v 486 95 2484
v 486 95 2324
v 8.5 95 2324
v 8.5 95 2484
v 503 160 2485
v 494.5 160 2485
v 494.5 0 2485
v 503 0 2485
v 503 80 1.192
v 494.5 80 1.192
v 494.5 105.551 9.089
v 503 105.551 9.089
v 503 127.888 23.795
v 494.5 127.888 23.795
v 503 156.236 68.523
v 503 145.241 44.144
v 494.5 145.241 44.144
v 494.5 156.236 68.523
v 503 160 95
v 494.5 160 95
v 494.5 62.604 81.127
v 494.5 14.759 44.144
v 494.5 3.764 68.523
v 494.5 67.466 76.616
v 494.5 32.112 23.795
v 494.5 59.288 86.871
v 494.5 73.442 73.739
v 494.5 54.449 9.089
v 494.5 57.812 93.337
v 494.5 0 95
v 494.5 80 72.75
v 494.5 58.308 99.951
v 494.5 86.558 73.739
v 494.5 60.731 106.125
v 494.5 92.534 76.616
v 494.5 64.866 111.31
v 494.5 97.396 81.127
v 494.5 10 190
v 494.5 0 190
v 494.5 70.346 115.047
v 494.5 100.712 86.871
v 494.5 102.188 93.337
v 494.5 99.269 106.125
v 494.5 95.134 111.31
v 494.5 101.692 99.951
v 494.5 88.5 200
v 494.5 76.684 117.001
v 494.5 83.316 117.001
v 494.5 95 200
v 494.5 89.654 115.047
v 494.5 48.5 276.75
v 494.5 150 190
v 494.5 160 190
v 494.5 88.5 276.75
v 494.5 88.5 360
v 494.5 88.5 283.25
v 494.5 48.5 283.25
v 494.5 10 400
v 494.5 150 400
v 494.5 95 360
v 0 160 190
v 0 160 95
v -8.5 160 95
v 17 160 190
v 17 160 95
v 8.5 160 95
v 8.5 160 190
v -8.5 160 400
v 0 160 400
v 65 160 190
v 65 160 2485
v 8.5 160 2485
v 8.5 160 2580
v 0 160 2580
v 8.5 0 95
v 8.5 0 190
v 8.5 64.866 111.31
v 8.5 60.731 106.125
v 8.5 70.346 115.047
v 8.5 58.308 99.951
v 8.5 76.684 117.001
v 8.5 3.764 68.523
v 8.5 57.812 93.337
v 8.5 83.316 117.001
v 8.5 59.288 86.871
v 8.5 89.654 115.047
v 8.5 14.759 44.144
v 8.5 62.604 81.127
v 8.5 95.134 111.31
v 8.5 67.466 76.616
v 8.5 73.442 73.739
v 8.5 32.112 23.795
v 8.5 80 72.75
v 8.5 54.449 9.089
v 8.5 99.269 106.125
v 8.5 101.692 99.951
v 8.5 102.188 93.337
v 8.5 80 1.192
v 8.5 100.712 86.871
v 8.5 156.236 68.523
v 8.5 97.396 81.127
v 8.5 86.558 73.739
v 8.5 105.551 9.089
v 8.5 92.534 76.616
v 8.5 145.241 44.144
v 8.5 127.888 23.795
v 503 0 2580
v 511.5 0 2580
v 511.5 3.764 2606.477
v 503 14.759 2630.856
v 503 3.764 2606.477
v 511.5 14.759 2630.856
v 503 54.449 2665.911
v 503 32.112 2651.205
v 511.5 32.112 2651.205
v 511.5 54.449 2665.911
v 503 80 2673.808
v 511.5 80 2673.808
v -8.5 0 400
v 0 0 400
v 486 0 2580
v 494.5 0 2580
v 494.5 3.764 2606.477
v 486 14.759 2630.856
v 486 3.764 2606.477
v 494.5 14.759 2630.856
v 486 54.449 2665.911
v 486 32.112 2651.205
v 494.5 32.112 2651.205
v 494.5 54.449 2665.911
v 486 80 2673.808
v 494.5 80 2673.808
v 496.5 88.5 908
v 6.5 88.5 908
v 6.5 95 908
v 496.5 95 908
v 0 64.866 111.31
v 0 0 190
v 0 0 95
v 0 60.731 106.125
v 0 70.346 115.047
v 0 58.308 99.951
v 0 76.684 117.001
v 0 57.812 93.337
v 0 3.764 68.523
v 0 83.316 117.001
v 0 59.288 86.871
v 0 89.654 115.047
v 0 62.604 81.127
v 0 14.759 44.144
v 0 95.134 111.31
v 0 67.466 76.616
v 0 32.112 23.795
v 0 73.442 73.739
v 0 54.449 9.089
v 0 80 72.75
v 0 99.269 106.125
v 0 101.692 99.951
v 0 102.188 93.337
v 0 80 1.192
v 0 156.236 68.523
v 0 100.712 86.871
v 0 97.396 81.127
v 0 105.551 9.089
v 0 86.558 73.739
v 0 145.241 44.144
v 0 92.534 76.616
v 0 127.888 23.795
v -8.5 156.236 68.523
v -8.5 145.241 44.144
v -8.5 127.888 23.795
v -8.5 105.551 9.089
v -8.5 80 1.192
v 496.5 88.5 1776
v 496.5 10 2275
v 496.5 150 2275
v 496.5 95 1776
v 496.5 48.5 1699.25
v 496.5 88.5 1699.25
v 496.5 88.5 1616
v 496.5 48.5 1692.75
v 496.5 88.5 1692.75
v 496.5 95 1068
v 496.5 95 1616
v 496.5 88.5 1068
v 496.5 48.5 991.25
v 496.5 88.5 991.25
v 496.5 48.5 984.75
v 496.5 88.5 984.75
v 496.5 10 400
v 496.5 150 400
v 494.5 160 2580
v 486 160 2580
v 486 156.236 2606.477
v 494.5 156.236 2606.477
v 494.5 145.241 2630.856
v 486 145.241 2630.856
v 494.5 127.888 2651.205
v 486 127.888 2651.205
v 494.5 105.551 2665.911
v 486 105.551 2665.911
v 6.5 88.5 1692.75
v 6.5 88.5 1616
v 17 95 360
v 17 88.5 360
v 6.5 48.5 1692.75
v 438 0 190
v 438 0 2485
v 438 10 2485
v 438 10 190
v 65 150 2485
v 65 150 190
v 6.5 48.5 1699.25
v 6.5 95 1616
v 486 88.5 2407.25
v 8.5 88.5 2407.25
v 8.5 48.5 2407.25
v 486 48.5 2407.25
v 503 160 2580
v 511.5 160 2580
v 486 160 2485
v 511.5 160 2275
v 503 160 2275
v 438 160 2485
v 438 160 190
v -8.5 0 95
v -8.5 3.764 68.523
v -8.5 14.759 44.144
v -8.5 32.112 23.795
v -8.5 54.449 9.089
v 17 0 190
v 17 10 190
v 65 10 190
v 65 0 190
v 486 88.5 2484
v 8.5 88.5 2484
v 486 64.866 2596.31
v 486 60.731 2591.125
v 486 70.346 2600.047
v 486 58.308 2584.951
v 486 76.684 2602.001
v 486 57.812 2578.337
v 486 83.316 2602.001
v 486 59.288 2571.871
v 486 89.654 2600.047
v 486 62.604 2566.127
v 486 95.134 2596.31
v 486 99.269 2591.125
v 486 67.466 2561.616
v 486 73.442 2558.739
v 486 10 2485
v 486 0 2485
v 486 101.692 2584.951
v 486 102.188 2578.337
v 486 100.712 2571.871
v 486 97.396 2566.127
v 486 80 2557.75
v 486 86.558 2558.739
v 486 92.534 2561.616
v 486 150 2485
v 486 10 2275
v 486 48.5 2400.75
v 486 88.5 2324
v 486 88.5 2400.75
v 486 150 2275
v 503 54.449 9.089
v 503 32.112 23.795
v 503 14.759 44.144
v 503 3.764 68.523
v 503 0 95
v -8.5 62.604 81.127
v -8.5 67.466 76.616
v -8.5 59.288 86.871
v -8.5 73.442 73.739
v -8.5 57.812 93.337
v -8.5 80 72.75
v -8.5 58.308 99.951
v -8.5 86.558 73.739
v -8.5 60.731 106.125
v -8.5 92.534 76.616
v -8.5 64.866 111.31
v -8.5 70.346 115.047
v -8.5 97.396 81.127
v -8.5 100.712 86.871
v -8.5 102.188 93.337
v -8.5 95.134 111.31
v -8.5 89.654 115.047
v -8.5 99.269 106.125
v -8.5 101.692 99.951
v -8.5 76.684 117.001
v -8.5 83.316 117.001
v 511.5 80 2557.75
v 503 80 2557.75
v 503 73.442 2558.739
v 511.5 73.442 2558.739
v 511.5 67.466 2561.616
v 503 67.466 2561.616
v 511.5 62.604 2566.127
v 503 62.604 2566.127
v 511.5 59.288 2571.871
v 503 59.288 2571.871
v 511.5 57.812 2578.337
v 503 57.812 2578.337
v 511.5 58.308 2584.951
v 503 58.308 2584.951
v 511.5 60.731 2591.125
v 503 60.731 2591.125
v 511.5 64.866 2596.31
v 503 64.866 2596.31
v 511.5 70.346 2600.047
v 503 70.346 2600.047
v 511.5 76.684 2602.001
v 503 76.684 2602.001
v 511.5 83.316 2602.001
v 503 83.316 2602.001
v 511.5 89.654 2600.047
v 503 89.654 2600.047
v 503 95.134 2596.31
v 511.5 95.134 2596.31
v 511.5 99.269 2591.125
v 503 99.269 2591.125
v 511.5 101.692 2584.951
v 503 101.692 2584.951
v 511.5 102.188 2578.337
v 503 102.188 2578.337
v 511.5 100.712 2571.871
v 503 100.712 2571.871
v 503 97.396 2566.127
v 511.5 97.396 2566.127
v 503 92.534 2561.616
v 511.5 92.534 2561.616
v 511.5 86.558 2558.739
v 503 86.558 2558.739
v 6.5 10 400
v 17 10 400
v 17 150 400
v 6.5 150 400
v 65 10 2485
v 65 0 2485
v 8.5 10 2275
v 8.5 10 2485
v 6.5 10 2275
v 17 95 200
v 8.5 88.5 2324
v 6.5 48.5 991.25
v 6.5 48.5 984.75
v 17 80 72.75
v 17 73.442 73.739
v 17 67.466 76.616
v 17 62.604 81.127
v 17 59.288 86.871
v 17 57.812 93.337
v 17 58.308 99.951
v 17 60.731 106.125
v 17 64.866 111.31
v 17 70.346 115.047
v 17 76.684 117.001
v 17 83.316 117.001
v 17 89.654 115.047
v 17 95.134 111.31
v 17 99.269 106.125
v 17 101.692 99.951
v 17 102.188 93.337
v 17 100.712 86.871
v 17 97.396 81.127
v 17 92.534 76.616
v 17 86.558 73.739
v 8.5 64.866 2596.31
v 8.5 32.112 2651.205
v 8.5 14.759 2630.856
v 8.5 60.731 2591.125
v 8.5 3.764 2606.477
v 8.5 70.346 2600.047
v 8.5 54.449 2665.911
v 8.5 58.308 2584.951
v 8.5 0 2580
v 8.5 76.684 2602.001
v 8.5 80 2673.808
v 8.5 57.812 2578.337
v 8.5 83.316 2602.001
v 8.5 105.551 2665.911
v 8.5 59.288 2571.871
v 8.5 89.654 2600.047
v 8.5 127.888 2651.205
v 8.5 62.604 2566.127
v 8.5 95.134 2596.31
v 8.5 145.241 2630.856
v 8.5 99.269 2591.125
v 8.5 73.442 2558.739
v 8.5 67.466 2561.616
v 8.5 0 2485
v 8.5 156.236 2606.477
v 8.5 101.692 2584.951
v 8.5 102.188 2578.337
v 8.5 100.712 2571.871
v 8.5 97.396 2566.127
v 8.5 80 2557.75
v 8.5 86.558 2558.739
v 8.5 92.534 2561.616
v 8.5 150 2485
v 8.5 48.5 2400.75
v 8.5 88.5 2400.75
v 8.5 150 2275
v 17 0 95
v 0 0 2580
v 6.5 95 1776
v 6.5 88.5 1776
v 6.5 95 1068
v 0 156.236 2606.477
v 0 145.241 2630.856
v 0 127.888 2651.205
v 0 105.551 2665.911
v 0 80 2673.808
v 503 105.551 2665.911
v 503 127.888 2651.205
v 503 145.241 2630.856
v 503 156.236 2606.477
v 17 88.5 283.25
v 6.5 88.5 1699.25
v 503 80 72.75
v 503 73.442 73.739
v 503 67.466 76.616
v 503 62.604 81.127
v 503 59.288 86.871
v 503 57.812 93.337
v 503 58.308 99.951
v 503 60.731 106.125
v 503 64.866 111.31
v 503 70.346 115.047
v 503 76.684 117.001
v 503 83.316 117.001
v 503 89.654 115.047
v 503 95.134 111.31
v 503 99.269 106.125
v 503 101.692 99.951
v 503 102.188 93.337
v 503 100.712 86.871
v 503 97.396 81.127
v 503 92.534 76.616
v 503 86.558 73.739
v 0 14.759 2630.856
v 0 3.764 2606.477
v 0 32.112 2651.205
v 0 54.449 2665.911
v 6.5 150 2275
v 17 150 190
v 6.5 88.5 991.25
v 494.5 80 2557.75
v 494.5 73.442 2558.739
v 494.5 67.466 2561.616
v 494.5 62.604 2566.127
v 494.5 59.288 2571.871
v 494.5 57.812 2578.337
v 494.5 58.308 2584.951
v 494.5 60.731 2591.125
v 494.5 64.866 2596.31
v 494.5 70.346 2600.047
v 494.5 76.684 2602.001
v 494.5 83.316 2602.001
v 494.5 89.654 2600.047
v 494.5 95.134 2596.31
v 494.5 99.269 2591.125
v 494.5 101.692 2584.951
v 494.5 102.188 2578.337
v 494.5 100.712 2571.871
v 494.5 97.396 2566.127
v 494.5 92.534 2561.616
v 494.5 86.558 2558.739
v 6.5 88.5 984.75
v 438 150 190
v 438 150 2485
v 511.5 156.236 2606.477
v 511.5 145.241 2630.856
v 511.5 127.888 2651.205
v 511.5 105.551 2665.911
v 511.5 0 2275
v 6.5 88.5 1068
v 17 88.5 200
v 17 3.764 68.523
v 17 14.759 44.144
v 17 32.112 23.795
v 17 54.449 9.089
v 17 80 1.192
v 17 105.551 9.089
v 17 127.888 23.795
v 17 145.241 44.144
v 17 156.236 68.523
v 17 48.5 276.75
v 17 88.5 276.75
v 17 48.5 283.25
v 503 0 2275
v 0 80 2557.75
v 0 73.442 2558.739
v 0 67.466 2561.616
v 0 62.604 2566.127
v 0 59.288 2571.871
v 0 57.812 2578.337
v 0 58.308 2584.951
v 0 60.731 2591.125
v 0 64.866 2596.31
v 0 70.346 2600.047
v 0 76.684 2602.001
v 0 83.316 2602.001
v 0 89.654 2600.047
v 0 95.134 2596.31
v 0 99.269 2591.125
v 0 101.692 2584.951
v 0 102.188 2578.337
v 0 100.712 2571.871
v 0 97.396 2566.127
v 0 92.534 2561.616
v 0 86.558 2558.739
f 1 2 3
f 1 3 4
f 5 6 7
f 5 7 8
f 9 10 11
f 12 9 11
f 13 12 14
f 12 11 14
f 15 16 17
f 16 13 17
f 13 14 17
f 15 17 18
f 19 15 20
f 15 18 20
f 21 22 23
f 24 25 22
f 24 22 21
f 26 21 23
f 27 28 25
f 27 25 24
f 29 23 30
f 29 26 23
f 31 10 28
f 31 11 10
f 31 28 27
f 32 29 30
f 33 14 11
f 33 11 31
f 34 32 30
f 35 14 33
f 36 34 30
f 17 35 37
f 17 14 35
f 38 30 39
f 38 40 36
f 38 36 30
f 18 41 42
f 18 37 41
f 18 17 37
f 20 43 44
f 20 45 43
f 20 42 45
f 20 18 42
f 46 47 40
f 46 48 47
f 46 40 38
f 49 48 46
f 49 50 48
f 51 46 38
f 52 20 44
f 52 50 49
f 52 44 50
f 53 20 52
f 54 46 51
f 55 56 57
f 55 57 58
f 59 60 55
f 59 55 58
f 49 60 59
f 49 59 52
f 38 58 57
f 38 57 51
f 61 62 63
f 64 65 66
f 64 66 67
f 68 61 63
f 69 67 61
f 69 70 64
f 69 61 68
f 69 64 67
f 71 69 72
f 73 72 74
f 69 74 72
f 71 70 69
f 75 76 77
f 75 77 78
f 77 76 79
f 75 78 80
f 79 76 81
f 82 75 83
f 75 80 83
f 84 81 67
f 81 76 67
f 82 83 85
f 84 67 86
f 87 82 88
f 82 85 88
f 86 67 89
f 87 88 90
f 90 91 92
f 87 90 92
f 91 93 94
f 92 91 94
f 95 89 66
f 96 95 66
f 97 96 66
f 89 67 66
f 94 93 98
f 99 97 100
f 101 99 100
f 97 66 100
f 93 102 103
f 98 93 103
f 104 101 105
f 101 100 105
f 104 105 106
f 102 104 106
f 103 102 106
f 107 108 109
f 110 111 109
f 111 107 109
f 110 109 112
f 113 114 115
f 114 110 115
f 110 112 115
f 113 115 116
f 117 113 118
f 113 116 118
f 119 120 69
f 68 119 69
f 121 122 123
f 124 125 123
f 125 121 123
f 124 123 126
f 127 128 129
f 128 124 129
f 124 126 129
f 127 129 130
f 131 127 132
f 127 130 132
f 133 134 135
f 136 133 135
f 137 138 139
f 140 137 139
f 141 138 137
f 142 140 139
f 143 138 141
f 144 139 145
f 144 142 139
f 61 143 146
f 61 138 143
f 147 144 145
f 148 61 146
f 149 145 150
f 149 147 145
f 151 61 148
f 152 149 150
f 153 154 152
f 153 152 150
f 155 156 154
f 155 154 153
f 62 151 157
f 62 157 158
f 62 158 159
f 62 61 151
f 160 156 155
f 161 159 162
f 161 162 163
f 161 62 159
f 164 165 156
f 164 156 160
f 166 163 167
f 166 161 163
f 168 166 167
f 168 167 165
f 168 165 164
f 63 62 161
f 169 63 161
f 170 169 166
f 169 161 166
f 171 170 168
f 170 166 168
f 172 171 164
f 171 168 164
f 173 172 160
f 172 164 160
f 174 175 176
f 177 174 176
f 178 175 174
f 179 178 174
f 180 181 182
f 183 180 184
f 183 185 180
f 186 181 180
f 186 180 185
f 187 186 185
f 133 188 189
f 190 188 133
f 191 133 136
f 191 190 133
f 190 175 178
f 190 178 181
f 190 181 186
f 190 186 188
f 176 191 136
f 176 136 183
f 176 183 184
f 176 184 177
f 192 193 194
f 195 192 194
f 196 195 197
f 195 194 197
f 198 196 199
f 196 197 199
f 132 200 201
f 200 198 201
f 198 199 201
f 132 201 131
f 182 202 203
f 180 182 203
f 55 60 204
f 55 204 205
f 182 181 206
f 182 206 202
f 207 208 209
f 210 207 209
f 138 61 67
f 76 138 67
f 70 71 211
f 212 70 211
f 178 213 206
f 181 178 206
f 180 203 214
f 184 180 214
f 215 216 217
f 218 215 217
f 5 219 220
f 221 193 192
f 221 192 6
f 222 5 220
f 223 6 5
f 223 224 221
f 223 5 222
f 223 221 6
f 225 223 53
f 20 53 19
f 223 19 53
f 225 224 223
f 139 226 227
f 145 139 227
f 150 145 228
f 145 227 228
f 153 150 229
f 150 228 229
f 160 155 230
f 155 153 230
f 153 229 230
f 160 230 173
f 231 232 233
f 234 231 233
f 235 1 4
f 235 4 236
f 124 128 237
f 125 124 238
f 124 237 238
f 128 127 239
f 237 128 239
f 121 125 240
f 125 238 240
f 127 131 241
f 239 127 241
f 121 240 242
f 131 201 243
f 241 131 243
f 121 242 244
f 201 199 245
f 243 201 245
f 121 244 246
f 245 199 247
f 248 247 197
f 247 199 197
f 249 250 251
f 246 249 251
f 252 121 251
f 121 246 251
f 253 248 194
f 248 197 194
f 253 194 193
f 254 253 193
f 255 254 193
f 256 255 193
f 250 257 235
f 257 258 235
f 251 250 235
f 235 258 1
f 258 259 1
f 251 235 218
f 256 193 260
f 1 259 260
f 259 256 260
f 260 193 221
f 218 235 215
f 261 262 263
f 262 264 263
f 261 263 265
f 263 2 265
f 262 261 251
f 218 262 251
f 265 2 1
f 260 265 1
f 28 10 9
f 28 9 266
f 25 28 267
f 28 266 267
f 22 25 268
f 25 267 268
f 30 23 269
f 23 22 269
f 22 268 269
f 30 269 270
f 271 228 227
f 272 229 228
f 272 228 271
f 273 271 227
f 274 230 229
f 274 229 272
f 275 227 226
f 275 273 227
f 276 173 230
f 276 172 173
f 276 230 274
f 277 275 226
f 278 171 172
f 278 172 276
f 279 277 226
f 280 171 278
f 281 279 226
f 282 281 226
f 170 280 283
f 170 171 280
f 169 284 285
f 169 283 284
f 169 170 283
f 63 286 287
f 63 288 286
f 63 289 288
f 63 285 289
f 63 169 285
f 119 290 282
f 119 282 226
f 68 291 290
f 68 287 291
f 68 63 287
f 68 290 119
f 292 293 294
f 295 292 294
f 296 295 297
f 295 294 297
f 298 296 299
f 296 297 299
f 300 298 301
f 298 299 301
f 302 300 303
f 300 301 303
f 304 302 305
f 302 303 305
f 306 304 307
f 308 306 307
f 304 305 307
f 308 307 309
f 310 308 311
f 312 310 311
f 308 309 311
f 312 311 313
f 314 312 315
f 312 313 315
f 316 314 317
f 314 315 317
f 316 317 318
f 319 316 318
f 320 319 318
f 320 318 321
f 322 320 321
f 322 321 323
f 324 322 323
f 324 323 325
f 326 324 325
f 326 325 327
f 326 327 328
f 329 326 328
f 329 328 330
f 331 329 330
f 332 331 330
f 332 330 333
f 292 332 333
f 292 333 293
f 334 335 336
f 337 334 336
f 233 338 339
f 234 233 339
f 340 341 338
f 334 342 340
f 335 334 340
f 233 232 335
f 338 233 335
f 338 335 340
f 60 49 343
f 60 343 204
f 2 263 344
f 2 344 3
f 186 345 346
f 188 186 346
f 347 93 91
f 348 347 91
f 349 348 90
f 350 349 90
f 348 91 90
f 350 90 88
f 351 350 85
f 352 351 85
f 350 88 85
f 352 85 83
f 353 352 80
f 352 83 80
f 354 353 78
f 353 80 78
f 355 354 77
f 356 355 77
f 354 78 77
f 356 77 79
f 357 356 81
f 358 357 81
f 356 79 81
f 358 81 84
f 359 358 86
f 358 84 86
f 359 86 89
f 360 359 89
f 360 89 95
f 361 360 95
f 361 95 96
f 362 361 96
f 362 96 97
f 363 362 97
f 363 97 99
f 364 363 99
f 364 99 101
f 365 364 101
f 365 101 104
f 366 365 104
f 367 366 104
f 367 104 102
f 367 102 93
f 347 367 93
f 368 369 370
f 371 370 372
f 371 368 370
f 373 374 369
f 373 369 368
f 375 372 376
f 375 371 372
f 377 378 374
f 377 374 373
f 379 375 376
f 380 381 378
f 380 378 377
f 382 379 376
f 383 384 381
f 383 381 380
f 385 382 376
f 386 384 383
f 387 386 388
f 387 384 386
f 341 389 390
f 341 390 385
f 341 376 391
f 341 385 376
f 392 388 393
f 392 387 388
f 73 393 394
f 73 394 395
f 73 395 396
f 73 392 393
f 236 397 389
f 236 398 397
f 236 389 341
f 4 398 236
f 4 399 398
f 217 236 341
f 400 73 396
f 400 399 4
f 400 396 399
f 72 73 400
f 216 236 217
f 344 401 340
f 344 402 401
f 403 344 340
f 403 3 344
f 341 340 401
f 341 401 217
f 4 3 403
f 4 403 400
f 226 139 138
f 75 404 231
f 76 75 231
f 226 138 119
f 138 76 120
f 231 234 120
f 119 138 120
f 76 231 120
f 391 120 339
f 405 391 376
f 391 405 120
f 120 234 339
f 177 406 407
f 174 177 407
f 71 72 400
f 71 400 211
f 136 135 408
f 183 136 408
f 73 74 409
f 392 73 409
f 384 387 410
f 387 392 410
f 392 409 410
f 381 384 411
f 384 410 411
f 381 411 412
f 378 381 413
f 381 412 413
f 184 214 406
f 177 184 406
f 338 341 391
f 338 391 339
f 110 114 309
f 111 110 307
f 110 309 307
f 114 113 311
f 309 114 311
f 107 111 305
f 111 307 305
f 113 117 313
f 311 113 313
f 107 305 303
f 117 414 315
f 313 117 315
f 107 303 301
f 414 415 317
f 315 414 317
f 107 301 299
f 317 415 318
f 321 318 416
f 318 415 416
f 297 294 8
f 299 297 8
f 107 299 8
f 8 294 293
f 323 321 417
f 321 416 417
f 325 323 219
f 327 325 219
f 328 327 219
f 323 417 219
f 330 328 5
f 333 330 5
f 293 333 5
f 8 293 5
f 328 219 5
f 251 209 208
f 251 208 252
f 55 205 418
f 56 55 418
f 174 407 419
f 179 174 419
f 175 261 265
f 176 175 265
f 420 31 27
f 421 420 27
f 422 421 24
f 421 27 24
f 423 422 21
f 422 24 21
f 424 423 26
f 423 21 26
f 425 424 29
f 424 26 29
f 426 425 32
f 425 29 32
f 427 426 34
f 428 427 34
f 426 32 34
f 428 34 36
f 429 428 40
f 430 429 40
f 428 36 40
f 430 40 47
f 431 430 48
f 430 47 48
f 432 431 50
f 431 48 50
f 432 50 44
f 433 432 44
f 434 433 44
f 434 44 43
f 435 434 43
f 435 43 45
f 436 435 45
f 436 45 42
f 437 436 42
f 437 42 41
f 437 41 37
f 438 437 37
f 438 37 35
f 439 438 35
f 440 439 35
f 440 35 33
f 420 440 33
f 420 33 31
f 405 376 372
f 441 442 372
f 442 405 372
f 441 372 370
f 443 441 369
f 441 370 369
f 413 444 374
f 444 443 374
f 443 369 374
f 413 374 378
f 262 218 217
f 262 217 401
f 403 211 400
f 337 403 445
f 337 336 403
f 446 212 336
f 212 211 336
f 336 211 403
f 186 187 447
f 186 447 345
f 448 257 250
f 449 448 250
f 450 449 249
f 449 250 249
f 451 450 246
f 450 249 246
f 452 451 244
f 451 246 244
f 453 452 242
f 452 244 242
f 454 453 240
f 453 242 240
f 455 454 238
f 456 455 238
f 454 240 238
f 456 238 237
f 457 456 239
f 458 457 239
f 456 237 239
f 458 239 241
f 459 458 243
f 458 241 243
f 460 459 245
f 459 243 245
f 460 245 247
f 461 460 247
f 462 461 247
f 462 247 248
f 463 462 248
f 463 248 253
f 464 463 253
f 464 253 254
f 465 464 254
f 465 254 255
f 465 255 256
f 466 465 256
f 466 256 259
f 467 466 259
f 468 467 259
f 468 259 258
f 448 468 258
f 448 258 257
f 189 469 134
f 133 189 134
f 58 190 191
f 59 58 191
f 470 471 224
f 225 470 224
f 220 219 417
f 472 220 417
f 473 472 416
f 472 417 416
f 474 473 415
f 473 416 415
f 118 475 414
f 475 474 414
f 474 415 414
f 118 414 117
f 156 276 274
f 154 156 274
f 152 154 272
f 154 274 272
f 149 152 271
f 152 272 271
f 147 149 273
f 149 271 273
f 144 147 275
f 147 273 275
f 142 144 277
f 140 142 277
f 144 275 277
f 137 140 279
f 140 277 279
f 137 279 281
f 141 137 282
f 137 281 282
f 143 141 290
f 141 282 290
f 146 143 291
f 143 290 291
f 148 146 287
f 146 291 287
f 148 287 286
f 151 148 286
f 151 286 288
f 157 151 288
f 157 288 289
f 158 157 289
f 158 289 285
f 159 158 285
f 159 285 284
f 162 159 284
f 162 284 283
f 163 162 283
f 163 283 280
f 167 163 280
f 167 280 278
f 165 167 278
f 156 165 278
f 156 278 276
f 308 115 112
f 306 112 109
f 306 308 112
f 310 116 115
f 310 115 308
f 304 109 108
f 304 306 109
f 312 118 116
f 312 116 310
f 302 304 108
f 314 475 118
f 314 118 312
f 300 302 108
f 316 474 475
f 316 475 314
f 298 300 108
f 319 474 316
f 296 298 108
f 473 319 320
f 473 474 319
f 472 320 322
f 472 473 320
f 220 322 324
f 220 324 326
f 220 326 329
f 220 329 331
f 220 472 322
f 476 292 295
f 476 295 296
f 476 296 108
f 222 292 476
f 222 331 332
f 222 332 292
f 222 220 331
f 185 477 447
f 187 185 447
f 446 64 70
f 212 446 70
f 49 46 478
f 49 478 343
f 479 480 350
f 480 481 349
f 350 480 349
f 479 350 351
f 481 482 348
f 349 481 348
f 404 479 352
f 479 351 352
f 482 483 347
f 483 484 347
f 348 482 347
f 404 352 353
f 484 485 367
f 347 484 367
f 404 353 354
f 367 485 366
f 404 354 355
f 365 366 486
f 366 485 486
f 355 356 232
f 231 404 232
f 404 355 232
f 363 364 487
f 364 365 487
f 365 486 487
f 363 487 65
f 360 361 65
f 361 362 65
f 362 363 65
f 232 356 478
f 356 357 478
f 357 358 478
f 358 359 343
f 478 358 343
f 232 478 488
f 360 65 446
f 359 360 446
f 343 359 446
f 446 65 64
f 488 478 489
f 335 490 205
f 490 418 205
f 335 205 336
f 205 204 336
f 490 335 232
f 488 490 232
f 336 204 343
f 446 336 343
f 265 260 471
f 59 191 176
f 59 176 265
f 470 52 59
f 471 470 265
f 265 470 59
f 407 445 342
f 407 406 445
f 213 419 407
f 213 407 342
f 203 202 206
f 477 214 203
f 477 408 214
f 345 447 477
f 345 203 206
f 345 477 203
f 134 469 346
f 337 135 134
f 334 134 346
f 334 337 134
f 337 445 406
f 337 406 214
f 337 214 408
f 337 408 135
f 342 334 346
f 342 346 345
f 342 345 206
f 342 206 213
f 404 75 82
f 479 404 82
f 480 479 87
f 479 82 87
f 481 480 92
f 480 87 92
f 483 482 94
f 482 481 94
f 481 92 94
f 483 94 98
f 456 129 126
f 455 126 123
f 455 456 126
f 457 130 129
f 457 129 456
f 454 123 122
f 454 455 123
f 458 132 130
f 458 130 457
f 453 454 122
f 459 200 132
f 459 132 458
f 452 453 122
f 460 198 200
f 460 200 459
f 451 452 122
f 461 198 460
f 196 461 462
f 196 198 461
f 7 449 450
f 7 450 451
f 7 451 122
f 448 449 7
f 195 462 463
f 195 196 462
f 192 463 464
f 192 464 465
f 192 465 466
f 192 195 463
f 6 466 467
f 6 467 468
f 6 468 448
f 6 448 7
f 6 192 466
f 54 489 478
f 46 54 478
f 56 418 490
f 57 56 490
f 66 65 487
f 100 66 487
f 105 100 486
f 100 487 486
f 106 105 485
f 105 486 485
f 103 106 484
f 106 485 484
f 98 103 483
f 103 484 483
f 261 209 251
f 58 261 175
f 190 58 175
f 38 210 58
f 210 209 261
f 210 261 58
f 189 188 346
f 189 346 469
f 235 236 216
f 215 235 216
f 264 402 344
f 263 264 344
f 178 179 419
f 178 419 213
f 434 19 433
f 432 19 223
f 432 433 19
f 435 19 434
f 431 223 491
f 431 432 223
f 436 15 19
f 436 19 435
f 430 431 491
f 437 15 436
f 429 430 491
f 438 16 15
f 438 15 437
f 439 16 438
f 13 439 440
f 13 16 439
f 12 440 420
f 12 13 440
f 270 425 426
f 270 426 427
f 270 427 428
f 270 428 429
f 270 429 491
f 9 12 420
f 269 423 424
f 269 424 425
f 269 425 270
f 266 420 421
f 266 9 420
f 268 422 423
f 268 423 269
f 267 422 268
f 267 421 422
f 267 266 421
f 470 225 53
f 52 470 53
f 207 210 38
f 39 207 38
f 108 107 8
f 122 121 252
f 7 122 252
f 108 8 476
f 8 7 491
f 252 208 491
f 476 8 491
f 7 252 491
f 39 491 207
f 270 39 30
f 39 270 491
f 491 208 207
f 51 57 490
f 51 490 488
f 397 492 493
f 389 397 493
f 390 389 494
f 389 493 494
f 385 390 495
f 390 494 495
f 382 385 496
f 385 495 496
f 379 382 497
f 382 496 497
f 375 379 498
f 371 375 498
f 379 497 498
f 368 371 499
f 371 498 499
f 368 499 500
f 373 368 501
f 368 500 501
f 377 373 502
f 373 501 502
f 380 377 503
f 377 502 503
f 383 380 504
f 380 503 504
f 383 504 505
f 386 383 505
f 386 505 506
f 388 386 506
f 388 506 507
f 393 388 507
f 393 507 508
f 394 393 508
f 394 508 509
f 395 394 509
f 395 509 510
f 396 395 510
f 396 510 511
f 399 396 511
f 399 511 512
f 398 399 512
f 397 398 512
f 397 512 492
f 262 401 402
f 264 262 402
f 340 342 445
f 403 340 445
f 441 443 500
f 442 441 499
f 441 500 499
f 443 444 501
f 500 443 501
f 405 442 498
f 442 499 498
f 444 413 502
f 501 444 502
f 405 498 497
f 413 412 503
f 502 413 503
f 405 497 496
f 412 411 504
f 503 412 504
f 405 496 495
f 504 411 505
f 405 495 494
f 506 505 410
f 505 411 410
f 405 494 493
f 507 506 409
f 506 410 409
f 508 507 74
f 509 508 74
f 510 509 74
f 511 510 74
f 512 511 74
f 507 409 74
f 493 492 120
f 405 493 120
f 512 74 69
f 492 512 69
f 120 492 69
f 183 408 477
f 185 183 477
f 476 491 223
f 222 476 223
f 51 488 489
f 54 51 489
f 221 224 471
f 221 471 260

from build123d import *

# Parameters (mm, degrees)
EXTRUDE_1_DEPTH        = 2675
EXTRUDE_1_2_DEPTH      = 2675
EXTRUDE_3_DEPTH        = 503
SKETCH_6_W             = 486
SKETCH_6_H             = 190
CUT_EXTRUDE_4_DEPTH    = 2727.57917545
PATTERN_LINEAR_1_COUNT = 4
PATTERN_LINEAR_1_PITCH = 708
SKETCH_7_W             = 400
SKETCH_7_H             = 140
EXTRUDE_5_DEPTH        = 2
SKETCH_15_W            = 400
SKETCH_15_H            = 140
EXTRUDE_8_DEPTH        = 2
SKETCH_19_W            = 400
SKETCH_19_H            = 160
EXTRUDE_11_DEPTH       = 8.5
PATTERN_LINEAR_2_COUNT = 2
PATTERN_LINEAR_2_PITCH = 17
SKETCH_22_W            = 8.5
SKETCH_22_H            = 190
CUT_EXTRUDE_12_DEPTH   = 2729.160048458
SKETCH_23_R            = 11
SKETCH_23_R_2          = 22.25
CUT_EXTRUDE_13_DEPTH   = 2729.160048458
SKETCH_26_W            = 400
SKETCH_26_H            = 160
EXTRUDE_14_DEPTH       = 8.5
PATTERN_LINEAR_3_COUNT = 2
PATTERN_LINEAR_3_PITCH = 17
SKETCH_27_W            = 8.5
SKETCH_27_H            = 190
CUT_EXTRUDE_15_DEPTH   = 2729.160048458
SKETCH_28_R            = 22.25
CUT_EXTRUDE_16_DEPTH   = 2730.766473528
FILLET_2_R             = 95


with BuildPart() as part:
    # 草图2 → 拉伸1 (new body)
    with BuildSketch(Plane.XY):
        Polygon((0, 0), (0, 160), (65, 160), (65, 150), (6.5, 150), (6.5, 10), (65, 10), (65, 0), align=None)
    extrude(amount=EXTRUDE_1_DEPTH)



with BuildPart() as body_2:
    # 草图2 → Extrude 1 2 (new body)
    with BuildSketch(Plane.XY):
        Polygon((438, 160), (503, 160), (503, 0), (438, 0), (438, 10), (496.5, 10), (496.5, 150), (438, 150), align=None)
    extrude(amount=EXTRUDE_1_2_DEPTH)


with BuildPart() as part_1:
    add(part.part)

    add(body_2.part)  # 拉伸3 merges body 2
    # 草图5 → 拉伸3 (add)
    with BuildSketch(Plane.ZY):
        Polygon((200, 95), (360, 95), (360, 88.5), (283.25, 88.5), (283.25, 48.5), (276.75, 48.5), (276.75, 88.5), (200, 88.5), align=None)
    extrude_3 = extrude(amount=-EXTRUDE_3_DEPTH)

    # 草图6 → 拉伸4 (cut, through all)
    with BuildSketch(Plane(origin=(0, 160, 0), x_dir=(1, 0, 0), z_dir=(0, 1, 0))):
        with Locations((251.5, -95)):
            Rectangle(SKETCH_6_W, SKETCH_6_H)
        with Locations((251.5, -2580)):
            Rectangle(SKETCH_6_W, SKETCH_6_H)
    extrude(amount=-CUT_EXTRUDE_4_DEPTH, mode=Mode.SUBTRACT)

    # 阵列(线性)1: 拉伸3 ×4
    with Locations(*[(0, 0, i * PATTERN_LINEAR_1_PITCH) for i in range(1, PATTERN_LINEAR_1_COUNT)]):
        add(extrude_3)

    # 草图7 → 拉伸5 (add)
    with BuildSketch(Plane.ZY.offset(-496.5)):
        with Locations((200, 80)):
            Rectangle(SKETCH_7_W, SKETCH_7_H)
        with Locations((2475, 80)):
            Rectangle(SKETCH_7_W, SKETCH_7_H)
    extrude(amount=EXTRUDE_5_DEPTH)

    # 草图15 → 拉伸8 (add)
    with BuildSketch(Plane(origin=(6.5, 0, 0), x_dir=(0, 0, -1), z_dir=(1, 0, 0))):
        with Locations((-2475, 80)):
            Rectangle(SKETCH_15_W, SKETCH_15_H)
        with Locations((-200, 80)):
            Rectangle(SKETCH_15_W, SKETCH_15_H)
    extrude(amount=EXTRUDE_8_DEPTH)

    # 草图19 → 拉伸11 (add)
    with BuildSketch(Plane(origin=(503, 0, 0), x_dir=(0, 0, -1), z_dir=(1, 0, 0))):
        with Locations((-2475, 80)):
            Rectangle(SKETCH_19_W, SKETCH_19_H)
    extrude_11 = extrude(amount=EXTRUDE_11_DEPTH)

    # 阵列(线性)2: 拉伸11 ×2
    with Locations(*[(-i * PATTERN_LINEAR_2_PITCH, 0, 0) for i in range(1, PATTERN_LINEAR_2_COUNT)]):
        add(extrude_11)

    # 草图22 → 拉伸12 (cut, through all)
    with BuildSketch(Plane(origin=(0, 160, 0), x_dir=(1, 0, 0), z_dir=(0, 1, 0))):
        with Locations((498.75, -2580)):
            Rectangle(SKETCH_22_W, SKETCH_22_H)
    extrude(amount=-CUT_EXTRUDE_12_DEPTH, mode=Mode.SUBTRACT)

    # 草图23 → 拉伸13 (cut, through all)
    with BuildSketch(Plane.ZY):
        with Locations((95, 80)):
            Circle(SKETCH_23_R)
        with Locations(Location((2580, 80, 0), (0, 0, 180))):
            Circle(SKETCH_23_R_2)
    extrude(amount=-CUT_EXTRUDE_13_DEPTH, mode=Mode.SUBTRACT)

    # 草图26 → 拉伸14 (add)
    with BuildSketch(Plane.ZY):
        with Locations((200, 80)):
            Rectangle(SKETCH_26_W, SKETCH_26_H)
    extrude_14 = extrude(amount=EXTRUDE_14_DEPTH)

    # 阵列(线性)3: 拉伸14 ×2
    with Locations(*[(i * PATTERN_LINEAR_3_PITCH, 0, 0) for i in range(1, PATTERN_LINEAR_3_COUNT)]):
        add(extrude_14)

    # 草图27 → 拉伸15 (cut, through all)
    with BuildSketch(Plane(origin=(0, 160, 0), x_dir=(1, 0, 0), z_dir=(0, 1, 0))):
        with Locations((4.25, -95)):
            Rectangle(SKETCH_27_W, SKETCH_27_H)
    extrude(amount=-CUT_EXTRUDE_15_DEPTH, mode=Mode.SUBTRACT)

    # 草图28 → 拉伸16 (cut, through all)
    with BuildSketch(Plane.ZY.offset(8.5)):
        with Locations(Location((95, 80, 0), (0, 0, 180))):
            Circle(SKETCH_28_R)
    extrude(amount=-CUT_EXTRUDE_16_DEPTH, mode=Mode.SUBTRACT)

    # 圆角2
    # the kernel refuses this fillet: 95 mm, written as the material it takes off along each edge
    with BuildSketch(Plane(origin=(-237.5, 160, 2675), x_dir=(0, 0, -1), z_dir=(1, 0, 0)), Plane(origin=(749, 0, 2675), x_dir=(0, 0, -1), z_dir=(-1, 0, 0)), Plane(origin=(265.5, 160, 2675), x_dir=(0, 0, -1), z_dir=(1, 0, 0)), Plane(origin=(237.5, 160, 0), x_dir=(0, 0, 1), z_dir=(-1, 0, 0)), Plane(origin=(254.5, 160, 0), x_dir=(0, 0, 1), z_dir=(-1, 0, 0)), Plane(origin=(-246, 0, 0), x_dir=(0, 0, 1), z_dir=(1, 0, 0)), Plane(origin=(-229, 0, 0), x_dir=(0, 0, 1), z_dir=(1, 0, 0))) as fillet_2_piece_1:
        with BuildLine():
            CenterArc((FILLET_2_R, -FILLET_2_R), FILLET_2_R, 90, 90)
            Line((0, -FILLET_2_R), (0, 0))
            Line((0, 0), (FILLET_2_R, 0))
        make_face()
    extrude(amount=483.5, mode=Mode.SUBTRACT)
    with BuildSketch(Plane(origin=(246, 0, 2675), x_dir=(0, 1, 0), z_dir=(-1, 0, 0)), Plane(origin=(732, 0, 2675), x_dir=(0, 1, 0), z_dir=(-1, 0, 0)), Plane(origin=(248.5, 160, 2675), x_dir=(0, -1, 0), z_dir=(1, 0, 0)), Plane(origin=(257, 160, 0), x_dir=(0, 0, 1), z_dir=(1, 0, 0)), Plane(origin=(740.5, 0, 0), x_dir=(0, 0, 1), z_dir=(-1, 0, 0))) as fillet_2_piece_2:
        with BuildLine():
            CenterArc((FILLET_2_R, FILLET_2_R), FILLET_2_R, 180, 90)
            Line((0, FILLET_2_R), (0, 0))
            Line((0, 0), (FILLET_2_R, 0))
        make_face()
    extrude(amount=483.5, mode=Mode.SUBTRACT)


solid = part_1.part
